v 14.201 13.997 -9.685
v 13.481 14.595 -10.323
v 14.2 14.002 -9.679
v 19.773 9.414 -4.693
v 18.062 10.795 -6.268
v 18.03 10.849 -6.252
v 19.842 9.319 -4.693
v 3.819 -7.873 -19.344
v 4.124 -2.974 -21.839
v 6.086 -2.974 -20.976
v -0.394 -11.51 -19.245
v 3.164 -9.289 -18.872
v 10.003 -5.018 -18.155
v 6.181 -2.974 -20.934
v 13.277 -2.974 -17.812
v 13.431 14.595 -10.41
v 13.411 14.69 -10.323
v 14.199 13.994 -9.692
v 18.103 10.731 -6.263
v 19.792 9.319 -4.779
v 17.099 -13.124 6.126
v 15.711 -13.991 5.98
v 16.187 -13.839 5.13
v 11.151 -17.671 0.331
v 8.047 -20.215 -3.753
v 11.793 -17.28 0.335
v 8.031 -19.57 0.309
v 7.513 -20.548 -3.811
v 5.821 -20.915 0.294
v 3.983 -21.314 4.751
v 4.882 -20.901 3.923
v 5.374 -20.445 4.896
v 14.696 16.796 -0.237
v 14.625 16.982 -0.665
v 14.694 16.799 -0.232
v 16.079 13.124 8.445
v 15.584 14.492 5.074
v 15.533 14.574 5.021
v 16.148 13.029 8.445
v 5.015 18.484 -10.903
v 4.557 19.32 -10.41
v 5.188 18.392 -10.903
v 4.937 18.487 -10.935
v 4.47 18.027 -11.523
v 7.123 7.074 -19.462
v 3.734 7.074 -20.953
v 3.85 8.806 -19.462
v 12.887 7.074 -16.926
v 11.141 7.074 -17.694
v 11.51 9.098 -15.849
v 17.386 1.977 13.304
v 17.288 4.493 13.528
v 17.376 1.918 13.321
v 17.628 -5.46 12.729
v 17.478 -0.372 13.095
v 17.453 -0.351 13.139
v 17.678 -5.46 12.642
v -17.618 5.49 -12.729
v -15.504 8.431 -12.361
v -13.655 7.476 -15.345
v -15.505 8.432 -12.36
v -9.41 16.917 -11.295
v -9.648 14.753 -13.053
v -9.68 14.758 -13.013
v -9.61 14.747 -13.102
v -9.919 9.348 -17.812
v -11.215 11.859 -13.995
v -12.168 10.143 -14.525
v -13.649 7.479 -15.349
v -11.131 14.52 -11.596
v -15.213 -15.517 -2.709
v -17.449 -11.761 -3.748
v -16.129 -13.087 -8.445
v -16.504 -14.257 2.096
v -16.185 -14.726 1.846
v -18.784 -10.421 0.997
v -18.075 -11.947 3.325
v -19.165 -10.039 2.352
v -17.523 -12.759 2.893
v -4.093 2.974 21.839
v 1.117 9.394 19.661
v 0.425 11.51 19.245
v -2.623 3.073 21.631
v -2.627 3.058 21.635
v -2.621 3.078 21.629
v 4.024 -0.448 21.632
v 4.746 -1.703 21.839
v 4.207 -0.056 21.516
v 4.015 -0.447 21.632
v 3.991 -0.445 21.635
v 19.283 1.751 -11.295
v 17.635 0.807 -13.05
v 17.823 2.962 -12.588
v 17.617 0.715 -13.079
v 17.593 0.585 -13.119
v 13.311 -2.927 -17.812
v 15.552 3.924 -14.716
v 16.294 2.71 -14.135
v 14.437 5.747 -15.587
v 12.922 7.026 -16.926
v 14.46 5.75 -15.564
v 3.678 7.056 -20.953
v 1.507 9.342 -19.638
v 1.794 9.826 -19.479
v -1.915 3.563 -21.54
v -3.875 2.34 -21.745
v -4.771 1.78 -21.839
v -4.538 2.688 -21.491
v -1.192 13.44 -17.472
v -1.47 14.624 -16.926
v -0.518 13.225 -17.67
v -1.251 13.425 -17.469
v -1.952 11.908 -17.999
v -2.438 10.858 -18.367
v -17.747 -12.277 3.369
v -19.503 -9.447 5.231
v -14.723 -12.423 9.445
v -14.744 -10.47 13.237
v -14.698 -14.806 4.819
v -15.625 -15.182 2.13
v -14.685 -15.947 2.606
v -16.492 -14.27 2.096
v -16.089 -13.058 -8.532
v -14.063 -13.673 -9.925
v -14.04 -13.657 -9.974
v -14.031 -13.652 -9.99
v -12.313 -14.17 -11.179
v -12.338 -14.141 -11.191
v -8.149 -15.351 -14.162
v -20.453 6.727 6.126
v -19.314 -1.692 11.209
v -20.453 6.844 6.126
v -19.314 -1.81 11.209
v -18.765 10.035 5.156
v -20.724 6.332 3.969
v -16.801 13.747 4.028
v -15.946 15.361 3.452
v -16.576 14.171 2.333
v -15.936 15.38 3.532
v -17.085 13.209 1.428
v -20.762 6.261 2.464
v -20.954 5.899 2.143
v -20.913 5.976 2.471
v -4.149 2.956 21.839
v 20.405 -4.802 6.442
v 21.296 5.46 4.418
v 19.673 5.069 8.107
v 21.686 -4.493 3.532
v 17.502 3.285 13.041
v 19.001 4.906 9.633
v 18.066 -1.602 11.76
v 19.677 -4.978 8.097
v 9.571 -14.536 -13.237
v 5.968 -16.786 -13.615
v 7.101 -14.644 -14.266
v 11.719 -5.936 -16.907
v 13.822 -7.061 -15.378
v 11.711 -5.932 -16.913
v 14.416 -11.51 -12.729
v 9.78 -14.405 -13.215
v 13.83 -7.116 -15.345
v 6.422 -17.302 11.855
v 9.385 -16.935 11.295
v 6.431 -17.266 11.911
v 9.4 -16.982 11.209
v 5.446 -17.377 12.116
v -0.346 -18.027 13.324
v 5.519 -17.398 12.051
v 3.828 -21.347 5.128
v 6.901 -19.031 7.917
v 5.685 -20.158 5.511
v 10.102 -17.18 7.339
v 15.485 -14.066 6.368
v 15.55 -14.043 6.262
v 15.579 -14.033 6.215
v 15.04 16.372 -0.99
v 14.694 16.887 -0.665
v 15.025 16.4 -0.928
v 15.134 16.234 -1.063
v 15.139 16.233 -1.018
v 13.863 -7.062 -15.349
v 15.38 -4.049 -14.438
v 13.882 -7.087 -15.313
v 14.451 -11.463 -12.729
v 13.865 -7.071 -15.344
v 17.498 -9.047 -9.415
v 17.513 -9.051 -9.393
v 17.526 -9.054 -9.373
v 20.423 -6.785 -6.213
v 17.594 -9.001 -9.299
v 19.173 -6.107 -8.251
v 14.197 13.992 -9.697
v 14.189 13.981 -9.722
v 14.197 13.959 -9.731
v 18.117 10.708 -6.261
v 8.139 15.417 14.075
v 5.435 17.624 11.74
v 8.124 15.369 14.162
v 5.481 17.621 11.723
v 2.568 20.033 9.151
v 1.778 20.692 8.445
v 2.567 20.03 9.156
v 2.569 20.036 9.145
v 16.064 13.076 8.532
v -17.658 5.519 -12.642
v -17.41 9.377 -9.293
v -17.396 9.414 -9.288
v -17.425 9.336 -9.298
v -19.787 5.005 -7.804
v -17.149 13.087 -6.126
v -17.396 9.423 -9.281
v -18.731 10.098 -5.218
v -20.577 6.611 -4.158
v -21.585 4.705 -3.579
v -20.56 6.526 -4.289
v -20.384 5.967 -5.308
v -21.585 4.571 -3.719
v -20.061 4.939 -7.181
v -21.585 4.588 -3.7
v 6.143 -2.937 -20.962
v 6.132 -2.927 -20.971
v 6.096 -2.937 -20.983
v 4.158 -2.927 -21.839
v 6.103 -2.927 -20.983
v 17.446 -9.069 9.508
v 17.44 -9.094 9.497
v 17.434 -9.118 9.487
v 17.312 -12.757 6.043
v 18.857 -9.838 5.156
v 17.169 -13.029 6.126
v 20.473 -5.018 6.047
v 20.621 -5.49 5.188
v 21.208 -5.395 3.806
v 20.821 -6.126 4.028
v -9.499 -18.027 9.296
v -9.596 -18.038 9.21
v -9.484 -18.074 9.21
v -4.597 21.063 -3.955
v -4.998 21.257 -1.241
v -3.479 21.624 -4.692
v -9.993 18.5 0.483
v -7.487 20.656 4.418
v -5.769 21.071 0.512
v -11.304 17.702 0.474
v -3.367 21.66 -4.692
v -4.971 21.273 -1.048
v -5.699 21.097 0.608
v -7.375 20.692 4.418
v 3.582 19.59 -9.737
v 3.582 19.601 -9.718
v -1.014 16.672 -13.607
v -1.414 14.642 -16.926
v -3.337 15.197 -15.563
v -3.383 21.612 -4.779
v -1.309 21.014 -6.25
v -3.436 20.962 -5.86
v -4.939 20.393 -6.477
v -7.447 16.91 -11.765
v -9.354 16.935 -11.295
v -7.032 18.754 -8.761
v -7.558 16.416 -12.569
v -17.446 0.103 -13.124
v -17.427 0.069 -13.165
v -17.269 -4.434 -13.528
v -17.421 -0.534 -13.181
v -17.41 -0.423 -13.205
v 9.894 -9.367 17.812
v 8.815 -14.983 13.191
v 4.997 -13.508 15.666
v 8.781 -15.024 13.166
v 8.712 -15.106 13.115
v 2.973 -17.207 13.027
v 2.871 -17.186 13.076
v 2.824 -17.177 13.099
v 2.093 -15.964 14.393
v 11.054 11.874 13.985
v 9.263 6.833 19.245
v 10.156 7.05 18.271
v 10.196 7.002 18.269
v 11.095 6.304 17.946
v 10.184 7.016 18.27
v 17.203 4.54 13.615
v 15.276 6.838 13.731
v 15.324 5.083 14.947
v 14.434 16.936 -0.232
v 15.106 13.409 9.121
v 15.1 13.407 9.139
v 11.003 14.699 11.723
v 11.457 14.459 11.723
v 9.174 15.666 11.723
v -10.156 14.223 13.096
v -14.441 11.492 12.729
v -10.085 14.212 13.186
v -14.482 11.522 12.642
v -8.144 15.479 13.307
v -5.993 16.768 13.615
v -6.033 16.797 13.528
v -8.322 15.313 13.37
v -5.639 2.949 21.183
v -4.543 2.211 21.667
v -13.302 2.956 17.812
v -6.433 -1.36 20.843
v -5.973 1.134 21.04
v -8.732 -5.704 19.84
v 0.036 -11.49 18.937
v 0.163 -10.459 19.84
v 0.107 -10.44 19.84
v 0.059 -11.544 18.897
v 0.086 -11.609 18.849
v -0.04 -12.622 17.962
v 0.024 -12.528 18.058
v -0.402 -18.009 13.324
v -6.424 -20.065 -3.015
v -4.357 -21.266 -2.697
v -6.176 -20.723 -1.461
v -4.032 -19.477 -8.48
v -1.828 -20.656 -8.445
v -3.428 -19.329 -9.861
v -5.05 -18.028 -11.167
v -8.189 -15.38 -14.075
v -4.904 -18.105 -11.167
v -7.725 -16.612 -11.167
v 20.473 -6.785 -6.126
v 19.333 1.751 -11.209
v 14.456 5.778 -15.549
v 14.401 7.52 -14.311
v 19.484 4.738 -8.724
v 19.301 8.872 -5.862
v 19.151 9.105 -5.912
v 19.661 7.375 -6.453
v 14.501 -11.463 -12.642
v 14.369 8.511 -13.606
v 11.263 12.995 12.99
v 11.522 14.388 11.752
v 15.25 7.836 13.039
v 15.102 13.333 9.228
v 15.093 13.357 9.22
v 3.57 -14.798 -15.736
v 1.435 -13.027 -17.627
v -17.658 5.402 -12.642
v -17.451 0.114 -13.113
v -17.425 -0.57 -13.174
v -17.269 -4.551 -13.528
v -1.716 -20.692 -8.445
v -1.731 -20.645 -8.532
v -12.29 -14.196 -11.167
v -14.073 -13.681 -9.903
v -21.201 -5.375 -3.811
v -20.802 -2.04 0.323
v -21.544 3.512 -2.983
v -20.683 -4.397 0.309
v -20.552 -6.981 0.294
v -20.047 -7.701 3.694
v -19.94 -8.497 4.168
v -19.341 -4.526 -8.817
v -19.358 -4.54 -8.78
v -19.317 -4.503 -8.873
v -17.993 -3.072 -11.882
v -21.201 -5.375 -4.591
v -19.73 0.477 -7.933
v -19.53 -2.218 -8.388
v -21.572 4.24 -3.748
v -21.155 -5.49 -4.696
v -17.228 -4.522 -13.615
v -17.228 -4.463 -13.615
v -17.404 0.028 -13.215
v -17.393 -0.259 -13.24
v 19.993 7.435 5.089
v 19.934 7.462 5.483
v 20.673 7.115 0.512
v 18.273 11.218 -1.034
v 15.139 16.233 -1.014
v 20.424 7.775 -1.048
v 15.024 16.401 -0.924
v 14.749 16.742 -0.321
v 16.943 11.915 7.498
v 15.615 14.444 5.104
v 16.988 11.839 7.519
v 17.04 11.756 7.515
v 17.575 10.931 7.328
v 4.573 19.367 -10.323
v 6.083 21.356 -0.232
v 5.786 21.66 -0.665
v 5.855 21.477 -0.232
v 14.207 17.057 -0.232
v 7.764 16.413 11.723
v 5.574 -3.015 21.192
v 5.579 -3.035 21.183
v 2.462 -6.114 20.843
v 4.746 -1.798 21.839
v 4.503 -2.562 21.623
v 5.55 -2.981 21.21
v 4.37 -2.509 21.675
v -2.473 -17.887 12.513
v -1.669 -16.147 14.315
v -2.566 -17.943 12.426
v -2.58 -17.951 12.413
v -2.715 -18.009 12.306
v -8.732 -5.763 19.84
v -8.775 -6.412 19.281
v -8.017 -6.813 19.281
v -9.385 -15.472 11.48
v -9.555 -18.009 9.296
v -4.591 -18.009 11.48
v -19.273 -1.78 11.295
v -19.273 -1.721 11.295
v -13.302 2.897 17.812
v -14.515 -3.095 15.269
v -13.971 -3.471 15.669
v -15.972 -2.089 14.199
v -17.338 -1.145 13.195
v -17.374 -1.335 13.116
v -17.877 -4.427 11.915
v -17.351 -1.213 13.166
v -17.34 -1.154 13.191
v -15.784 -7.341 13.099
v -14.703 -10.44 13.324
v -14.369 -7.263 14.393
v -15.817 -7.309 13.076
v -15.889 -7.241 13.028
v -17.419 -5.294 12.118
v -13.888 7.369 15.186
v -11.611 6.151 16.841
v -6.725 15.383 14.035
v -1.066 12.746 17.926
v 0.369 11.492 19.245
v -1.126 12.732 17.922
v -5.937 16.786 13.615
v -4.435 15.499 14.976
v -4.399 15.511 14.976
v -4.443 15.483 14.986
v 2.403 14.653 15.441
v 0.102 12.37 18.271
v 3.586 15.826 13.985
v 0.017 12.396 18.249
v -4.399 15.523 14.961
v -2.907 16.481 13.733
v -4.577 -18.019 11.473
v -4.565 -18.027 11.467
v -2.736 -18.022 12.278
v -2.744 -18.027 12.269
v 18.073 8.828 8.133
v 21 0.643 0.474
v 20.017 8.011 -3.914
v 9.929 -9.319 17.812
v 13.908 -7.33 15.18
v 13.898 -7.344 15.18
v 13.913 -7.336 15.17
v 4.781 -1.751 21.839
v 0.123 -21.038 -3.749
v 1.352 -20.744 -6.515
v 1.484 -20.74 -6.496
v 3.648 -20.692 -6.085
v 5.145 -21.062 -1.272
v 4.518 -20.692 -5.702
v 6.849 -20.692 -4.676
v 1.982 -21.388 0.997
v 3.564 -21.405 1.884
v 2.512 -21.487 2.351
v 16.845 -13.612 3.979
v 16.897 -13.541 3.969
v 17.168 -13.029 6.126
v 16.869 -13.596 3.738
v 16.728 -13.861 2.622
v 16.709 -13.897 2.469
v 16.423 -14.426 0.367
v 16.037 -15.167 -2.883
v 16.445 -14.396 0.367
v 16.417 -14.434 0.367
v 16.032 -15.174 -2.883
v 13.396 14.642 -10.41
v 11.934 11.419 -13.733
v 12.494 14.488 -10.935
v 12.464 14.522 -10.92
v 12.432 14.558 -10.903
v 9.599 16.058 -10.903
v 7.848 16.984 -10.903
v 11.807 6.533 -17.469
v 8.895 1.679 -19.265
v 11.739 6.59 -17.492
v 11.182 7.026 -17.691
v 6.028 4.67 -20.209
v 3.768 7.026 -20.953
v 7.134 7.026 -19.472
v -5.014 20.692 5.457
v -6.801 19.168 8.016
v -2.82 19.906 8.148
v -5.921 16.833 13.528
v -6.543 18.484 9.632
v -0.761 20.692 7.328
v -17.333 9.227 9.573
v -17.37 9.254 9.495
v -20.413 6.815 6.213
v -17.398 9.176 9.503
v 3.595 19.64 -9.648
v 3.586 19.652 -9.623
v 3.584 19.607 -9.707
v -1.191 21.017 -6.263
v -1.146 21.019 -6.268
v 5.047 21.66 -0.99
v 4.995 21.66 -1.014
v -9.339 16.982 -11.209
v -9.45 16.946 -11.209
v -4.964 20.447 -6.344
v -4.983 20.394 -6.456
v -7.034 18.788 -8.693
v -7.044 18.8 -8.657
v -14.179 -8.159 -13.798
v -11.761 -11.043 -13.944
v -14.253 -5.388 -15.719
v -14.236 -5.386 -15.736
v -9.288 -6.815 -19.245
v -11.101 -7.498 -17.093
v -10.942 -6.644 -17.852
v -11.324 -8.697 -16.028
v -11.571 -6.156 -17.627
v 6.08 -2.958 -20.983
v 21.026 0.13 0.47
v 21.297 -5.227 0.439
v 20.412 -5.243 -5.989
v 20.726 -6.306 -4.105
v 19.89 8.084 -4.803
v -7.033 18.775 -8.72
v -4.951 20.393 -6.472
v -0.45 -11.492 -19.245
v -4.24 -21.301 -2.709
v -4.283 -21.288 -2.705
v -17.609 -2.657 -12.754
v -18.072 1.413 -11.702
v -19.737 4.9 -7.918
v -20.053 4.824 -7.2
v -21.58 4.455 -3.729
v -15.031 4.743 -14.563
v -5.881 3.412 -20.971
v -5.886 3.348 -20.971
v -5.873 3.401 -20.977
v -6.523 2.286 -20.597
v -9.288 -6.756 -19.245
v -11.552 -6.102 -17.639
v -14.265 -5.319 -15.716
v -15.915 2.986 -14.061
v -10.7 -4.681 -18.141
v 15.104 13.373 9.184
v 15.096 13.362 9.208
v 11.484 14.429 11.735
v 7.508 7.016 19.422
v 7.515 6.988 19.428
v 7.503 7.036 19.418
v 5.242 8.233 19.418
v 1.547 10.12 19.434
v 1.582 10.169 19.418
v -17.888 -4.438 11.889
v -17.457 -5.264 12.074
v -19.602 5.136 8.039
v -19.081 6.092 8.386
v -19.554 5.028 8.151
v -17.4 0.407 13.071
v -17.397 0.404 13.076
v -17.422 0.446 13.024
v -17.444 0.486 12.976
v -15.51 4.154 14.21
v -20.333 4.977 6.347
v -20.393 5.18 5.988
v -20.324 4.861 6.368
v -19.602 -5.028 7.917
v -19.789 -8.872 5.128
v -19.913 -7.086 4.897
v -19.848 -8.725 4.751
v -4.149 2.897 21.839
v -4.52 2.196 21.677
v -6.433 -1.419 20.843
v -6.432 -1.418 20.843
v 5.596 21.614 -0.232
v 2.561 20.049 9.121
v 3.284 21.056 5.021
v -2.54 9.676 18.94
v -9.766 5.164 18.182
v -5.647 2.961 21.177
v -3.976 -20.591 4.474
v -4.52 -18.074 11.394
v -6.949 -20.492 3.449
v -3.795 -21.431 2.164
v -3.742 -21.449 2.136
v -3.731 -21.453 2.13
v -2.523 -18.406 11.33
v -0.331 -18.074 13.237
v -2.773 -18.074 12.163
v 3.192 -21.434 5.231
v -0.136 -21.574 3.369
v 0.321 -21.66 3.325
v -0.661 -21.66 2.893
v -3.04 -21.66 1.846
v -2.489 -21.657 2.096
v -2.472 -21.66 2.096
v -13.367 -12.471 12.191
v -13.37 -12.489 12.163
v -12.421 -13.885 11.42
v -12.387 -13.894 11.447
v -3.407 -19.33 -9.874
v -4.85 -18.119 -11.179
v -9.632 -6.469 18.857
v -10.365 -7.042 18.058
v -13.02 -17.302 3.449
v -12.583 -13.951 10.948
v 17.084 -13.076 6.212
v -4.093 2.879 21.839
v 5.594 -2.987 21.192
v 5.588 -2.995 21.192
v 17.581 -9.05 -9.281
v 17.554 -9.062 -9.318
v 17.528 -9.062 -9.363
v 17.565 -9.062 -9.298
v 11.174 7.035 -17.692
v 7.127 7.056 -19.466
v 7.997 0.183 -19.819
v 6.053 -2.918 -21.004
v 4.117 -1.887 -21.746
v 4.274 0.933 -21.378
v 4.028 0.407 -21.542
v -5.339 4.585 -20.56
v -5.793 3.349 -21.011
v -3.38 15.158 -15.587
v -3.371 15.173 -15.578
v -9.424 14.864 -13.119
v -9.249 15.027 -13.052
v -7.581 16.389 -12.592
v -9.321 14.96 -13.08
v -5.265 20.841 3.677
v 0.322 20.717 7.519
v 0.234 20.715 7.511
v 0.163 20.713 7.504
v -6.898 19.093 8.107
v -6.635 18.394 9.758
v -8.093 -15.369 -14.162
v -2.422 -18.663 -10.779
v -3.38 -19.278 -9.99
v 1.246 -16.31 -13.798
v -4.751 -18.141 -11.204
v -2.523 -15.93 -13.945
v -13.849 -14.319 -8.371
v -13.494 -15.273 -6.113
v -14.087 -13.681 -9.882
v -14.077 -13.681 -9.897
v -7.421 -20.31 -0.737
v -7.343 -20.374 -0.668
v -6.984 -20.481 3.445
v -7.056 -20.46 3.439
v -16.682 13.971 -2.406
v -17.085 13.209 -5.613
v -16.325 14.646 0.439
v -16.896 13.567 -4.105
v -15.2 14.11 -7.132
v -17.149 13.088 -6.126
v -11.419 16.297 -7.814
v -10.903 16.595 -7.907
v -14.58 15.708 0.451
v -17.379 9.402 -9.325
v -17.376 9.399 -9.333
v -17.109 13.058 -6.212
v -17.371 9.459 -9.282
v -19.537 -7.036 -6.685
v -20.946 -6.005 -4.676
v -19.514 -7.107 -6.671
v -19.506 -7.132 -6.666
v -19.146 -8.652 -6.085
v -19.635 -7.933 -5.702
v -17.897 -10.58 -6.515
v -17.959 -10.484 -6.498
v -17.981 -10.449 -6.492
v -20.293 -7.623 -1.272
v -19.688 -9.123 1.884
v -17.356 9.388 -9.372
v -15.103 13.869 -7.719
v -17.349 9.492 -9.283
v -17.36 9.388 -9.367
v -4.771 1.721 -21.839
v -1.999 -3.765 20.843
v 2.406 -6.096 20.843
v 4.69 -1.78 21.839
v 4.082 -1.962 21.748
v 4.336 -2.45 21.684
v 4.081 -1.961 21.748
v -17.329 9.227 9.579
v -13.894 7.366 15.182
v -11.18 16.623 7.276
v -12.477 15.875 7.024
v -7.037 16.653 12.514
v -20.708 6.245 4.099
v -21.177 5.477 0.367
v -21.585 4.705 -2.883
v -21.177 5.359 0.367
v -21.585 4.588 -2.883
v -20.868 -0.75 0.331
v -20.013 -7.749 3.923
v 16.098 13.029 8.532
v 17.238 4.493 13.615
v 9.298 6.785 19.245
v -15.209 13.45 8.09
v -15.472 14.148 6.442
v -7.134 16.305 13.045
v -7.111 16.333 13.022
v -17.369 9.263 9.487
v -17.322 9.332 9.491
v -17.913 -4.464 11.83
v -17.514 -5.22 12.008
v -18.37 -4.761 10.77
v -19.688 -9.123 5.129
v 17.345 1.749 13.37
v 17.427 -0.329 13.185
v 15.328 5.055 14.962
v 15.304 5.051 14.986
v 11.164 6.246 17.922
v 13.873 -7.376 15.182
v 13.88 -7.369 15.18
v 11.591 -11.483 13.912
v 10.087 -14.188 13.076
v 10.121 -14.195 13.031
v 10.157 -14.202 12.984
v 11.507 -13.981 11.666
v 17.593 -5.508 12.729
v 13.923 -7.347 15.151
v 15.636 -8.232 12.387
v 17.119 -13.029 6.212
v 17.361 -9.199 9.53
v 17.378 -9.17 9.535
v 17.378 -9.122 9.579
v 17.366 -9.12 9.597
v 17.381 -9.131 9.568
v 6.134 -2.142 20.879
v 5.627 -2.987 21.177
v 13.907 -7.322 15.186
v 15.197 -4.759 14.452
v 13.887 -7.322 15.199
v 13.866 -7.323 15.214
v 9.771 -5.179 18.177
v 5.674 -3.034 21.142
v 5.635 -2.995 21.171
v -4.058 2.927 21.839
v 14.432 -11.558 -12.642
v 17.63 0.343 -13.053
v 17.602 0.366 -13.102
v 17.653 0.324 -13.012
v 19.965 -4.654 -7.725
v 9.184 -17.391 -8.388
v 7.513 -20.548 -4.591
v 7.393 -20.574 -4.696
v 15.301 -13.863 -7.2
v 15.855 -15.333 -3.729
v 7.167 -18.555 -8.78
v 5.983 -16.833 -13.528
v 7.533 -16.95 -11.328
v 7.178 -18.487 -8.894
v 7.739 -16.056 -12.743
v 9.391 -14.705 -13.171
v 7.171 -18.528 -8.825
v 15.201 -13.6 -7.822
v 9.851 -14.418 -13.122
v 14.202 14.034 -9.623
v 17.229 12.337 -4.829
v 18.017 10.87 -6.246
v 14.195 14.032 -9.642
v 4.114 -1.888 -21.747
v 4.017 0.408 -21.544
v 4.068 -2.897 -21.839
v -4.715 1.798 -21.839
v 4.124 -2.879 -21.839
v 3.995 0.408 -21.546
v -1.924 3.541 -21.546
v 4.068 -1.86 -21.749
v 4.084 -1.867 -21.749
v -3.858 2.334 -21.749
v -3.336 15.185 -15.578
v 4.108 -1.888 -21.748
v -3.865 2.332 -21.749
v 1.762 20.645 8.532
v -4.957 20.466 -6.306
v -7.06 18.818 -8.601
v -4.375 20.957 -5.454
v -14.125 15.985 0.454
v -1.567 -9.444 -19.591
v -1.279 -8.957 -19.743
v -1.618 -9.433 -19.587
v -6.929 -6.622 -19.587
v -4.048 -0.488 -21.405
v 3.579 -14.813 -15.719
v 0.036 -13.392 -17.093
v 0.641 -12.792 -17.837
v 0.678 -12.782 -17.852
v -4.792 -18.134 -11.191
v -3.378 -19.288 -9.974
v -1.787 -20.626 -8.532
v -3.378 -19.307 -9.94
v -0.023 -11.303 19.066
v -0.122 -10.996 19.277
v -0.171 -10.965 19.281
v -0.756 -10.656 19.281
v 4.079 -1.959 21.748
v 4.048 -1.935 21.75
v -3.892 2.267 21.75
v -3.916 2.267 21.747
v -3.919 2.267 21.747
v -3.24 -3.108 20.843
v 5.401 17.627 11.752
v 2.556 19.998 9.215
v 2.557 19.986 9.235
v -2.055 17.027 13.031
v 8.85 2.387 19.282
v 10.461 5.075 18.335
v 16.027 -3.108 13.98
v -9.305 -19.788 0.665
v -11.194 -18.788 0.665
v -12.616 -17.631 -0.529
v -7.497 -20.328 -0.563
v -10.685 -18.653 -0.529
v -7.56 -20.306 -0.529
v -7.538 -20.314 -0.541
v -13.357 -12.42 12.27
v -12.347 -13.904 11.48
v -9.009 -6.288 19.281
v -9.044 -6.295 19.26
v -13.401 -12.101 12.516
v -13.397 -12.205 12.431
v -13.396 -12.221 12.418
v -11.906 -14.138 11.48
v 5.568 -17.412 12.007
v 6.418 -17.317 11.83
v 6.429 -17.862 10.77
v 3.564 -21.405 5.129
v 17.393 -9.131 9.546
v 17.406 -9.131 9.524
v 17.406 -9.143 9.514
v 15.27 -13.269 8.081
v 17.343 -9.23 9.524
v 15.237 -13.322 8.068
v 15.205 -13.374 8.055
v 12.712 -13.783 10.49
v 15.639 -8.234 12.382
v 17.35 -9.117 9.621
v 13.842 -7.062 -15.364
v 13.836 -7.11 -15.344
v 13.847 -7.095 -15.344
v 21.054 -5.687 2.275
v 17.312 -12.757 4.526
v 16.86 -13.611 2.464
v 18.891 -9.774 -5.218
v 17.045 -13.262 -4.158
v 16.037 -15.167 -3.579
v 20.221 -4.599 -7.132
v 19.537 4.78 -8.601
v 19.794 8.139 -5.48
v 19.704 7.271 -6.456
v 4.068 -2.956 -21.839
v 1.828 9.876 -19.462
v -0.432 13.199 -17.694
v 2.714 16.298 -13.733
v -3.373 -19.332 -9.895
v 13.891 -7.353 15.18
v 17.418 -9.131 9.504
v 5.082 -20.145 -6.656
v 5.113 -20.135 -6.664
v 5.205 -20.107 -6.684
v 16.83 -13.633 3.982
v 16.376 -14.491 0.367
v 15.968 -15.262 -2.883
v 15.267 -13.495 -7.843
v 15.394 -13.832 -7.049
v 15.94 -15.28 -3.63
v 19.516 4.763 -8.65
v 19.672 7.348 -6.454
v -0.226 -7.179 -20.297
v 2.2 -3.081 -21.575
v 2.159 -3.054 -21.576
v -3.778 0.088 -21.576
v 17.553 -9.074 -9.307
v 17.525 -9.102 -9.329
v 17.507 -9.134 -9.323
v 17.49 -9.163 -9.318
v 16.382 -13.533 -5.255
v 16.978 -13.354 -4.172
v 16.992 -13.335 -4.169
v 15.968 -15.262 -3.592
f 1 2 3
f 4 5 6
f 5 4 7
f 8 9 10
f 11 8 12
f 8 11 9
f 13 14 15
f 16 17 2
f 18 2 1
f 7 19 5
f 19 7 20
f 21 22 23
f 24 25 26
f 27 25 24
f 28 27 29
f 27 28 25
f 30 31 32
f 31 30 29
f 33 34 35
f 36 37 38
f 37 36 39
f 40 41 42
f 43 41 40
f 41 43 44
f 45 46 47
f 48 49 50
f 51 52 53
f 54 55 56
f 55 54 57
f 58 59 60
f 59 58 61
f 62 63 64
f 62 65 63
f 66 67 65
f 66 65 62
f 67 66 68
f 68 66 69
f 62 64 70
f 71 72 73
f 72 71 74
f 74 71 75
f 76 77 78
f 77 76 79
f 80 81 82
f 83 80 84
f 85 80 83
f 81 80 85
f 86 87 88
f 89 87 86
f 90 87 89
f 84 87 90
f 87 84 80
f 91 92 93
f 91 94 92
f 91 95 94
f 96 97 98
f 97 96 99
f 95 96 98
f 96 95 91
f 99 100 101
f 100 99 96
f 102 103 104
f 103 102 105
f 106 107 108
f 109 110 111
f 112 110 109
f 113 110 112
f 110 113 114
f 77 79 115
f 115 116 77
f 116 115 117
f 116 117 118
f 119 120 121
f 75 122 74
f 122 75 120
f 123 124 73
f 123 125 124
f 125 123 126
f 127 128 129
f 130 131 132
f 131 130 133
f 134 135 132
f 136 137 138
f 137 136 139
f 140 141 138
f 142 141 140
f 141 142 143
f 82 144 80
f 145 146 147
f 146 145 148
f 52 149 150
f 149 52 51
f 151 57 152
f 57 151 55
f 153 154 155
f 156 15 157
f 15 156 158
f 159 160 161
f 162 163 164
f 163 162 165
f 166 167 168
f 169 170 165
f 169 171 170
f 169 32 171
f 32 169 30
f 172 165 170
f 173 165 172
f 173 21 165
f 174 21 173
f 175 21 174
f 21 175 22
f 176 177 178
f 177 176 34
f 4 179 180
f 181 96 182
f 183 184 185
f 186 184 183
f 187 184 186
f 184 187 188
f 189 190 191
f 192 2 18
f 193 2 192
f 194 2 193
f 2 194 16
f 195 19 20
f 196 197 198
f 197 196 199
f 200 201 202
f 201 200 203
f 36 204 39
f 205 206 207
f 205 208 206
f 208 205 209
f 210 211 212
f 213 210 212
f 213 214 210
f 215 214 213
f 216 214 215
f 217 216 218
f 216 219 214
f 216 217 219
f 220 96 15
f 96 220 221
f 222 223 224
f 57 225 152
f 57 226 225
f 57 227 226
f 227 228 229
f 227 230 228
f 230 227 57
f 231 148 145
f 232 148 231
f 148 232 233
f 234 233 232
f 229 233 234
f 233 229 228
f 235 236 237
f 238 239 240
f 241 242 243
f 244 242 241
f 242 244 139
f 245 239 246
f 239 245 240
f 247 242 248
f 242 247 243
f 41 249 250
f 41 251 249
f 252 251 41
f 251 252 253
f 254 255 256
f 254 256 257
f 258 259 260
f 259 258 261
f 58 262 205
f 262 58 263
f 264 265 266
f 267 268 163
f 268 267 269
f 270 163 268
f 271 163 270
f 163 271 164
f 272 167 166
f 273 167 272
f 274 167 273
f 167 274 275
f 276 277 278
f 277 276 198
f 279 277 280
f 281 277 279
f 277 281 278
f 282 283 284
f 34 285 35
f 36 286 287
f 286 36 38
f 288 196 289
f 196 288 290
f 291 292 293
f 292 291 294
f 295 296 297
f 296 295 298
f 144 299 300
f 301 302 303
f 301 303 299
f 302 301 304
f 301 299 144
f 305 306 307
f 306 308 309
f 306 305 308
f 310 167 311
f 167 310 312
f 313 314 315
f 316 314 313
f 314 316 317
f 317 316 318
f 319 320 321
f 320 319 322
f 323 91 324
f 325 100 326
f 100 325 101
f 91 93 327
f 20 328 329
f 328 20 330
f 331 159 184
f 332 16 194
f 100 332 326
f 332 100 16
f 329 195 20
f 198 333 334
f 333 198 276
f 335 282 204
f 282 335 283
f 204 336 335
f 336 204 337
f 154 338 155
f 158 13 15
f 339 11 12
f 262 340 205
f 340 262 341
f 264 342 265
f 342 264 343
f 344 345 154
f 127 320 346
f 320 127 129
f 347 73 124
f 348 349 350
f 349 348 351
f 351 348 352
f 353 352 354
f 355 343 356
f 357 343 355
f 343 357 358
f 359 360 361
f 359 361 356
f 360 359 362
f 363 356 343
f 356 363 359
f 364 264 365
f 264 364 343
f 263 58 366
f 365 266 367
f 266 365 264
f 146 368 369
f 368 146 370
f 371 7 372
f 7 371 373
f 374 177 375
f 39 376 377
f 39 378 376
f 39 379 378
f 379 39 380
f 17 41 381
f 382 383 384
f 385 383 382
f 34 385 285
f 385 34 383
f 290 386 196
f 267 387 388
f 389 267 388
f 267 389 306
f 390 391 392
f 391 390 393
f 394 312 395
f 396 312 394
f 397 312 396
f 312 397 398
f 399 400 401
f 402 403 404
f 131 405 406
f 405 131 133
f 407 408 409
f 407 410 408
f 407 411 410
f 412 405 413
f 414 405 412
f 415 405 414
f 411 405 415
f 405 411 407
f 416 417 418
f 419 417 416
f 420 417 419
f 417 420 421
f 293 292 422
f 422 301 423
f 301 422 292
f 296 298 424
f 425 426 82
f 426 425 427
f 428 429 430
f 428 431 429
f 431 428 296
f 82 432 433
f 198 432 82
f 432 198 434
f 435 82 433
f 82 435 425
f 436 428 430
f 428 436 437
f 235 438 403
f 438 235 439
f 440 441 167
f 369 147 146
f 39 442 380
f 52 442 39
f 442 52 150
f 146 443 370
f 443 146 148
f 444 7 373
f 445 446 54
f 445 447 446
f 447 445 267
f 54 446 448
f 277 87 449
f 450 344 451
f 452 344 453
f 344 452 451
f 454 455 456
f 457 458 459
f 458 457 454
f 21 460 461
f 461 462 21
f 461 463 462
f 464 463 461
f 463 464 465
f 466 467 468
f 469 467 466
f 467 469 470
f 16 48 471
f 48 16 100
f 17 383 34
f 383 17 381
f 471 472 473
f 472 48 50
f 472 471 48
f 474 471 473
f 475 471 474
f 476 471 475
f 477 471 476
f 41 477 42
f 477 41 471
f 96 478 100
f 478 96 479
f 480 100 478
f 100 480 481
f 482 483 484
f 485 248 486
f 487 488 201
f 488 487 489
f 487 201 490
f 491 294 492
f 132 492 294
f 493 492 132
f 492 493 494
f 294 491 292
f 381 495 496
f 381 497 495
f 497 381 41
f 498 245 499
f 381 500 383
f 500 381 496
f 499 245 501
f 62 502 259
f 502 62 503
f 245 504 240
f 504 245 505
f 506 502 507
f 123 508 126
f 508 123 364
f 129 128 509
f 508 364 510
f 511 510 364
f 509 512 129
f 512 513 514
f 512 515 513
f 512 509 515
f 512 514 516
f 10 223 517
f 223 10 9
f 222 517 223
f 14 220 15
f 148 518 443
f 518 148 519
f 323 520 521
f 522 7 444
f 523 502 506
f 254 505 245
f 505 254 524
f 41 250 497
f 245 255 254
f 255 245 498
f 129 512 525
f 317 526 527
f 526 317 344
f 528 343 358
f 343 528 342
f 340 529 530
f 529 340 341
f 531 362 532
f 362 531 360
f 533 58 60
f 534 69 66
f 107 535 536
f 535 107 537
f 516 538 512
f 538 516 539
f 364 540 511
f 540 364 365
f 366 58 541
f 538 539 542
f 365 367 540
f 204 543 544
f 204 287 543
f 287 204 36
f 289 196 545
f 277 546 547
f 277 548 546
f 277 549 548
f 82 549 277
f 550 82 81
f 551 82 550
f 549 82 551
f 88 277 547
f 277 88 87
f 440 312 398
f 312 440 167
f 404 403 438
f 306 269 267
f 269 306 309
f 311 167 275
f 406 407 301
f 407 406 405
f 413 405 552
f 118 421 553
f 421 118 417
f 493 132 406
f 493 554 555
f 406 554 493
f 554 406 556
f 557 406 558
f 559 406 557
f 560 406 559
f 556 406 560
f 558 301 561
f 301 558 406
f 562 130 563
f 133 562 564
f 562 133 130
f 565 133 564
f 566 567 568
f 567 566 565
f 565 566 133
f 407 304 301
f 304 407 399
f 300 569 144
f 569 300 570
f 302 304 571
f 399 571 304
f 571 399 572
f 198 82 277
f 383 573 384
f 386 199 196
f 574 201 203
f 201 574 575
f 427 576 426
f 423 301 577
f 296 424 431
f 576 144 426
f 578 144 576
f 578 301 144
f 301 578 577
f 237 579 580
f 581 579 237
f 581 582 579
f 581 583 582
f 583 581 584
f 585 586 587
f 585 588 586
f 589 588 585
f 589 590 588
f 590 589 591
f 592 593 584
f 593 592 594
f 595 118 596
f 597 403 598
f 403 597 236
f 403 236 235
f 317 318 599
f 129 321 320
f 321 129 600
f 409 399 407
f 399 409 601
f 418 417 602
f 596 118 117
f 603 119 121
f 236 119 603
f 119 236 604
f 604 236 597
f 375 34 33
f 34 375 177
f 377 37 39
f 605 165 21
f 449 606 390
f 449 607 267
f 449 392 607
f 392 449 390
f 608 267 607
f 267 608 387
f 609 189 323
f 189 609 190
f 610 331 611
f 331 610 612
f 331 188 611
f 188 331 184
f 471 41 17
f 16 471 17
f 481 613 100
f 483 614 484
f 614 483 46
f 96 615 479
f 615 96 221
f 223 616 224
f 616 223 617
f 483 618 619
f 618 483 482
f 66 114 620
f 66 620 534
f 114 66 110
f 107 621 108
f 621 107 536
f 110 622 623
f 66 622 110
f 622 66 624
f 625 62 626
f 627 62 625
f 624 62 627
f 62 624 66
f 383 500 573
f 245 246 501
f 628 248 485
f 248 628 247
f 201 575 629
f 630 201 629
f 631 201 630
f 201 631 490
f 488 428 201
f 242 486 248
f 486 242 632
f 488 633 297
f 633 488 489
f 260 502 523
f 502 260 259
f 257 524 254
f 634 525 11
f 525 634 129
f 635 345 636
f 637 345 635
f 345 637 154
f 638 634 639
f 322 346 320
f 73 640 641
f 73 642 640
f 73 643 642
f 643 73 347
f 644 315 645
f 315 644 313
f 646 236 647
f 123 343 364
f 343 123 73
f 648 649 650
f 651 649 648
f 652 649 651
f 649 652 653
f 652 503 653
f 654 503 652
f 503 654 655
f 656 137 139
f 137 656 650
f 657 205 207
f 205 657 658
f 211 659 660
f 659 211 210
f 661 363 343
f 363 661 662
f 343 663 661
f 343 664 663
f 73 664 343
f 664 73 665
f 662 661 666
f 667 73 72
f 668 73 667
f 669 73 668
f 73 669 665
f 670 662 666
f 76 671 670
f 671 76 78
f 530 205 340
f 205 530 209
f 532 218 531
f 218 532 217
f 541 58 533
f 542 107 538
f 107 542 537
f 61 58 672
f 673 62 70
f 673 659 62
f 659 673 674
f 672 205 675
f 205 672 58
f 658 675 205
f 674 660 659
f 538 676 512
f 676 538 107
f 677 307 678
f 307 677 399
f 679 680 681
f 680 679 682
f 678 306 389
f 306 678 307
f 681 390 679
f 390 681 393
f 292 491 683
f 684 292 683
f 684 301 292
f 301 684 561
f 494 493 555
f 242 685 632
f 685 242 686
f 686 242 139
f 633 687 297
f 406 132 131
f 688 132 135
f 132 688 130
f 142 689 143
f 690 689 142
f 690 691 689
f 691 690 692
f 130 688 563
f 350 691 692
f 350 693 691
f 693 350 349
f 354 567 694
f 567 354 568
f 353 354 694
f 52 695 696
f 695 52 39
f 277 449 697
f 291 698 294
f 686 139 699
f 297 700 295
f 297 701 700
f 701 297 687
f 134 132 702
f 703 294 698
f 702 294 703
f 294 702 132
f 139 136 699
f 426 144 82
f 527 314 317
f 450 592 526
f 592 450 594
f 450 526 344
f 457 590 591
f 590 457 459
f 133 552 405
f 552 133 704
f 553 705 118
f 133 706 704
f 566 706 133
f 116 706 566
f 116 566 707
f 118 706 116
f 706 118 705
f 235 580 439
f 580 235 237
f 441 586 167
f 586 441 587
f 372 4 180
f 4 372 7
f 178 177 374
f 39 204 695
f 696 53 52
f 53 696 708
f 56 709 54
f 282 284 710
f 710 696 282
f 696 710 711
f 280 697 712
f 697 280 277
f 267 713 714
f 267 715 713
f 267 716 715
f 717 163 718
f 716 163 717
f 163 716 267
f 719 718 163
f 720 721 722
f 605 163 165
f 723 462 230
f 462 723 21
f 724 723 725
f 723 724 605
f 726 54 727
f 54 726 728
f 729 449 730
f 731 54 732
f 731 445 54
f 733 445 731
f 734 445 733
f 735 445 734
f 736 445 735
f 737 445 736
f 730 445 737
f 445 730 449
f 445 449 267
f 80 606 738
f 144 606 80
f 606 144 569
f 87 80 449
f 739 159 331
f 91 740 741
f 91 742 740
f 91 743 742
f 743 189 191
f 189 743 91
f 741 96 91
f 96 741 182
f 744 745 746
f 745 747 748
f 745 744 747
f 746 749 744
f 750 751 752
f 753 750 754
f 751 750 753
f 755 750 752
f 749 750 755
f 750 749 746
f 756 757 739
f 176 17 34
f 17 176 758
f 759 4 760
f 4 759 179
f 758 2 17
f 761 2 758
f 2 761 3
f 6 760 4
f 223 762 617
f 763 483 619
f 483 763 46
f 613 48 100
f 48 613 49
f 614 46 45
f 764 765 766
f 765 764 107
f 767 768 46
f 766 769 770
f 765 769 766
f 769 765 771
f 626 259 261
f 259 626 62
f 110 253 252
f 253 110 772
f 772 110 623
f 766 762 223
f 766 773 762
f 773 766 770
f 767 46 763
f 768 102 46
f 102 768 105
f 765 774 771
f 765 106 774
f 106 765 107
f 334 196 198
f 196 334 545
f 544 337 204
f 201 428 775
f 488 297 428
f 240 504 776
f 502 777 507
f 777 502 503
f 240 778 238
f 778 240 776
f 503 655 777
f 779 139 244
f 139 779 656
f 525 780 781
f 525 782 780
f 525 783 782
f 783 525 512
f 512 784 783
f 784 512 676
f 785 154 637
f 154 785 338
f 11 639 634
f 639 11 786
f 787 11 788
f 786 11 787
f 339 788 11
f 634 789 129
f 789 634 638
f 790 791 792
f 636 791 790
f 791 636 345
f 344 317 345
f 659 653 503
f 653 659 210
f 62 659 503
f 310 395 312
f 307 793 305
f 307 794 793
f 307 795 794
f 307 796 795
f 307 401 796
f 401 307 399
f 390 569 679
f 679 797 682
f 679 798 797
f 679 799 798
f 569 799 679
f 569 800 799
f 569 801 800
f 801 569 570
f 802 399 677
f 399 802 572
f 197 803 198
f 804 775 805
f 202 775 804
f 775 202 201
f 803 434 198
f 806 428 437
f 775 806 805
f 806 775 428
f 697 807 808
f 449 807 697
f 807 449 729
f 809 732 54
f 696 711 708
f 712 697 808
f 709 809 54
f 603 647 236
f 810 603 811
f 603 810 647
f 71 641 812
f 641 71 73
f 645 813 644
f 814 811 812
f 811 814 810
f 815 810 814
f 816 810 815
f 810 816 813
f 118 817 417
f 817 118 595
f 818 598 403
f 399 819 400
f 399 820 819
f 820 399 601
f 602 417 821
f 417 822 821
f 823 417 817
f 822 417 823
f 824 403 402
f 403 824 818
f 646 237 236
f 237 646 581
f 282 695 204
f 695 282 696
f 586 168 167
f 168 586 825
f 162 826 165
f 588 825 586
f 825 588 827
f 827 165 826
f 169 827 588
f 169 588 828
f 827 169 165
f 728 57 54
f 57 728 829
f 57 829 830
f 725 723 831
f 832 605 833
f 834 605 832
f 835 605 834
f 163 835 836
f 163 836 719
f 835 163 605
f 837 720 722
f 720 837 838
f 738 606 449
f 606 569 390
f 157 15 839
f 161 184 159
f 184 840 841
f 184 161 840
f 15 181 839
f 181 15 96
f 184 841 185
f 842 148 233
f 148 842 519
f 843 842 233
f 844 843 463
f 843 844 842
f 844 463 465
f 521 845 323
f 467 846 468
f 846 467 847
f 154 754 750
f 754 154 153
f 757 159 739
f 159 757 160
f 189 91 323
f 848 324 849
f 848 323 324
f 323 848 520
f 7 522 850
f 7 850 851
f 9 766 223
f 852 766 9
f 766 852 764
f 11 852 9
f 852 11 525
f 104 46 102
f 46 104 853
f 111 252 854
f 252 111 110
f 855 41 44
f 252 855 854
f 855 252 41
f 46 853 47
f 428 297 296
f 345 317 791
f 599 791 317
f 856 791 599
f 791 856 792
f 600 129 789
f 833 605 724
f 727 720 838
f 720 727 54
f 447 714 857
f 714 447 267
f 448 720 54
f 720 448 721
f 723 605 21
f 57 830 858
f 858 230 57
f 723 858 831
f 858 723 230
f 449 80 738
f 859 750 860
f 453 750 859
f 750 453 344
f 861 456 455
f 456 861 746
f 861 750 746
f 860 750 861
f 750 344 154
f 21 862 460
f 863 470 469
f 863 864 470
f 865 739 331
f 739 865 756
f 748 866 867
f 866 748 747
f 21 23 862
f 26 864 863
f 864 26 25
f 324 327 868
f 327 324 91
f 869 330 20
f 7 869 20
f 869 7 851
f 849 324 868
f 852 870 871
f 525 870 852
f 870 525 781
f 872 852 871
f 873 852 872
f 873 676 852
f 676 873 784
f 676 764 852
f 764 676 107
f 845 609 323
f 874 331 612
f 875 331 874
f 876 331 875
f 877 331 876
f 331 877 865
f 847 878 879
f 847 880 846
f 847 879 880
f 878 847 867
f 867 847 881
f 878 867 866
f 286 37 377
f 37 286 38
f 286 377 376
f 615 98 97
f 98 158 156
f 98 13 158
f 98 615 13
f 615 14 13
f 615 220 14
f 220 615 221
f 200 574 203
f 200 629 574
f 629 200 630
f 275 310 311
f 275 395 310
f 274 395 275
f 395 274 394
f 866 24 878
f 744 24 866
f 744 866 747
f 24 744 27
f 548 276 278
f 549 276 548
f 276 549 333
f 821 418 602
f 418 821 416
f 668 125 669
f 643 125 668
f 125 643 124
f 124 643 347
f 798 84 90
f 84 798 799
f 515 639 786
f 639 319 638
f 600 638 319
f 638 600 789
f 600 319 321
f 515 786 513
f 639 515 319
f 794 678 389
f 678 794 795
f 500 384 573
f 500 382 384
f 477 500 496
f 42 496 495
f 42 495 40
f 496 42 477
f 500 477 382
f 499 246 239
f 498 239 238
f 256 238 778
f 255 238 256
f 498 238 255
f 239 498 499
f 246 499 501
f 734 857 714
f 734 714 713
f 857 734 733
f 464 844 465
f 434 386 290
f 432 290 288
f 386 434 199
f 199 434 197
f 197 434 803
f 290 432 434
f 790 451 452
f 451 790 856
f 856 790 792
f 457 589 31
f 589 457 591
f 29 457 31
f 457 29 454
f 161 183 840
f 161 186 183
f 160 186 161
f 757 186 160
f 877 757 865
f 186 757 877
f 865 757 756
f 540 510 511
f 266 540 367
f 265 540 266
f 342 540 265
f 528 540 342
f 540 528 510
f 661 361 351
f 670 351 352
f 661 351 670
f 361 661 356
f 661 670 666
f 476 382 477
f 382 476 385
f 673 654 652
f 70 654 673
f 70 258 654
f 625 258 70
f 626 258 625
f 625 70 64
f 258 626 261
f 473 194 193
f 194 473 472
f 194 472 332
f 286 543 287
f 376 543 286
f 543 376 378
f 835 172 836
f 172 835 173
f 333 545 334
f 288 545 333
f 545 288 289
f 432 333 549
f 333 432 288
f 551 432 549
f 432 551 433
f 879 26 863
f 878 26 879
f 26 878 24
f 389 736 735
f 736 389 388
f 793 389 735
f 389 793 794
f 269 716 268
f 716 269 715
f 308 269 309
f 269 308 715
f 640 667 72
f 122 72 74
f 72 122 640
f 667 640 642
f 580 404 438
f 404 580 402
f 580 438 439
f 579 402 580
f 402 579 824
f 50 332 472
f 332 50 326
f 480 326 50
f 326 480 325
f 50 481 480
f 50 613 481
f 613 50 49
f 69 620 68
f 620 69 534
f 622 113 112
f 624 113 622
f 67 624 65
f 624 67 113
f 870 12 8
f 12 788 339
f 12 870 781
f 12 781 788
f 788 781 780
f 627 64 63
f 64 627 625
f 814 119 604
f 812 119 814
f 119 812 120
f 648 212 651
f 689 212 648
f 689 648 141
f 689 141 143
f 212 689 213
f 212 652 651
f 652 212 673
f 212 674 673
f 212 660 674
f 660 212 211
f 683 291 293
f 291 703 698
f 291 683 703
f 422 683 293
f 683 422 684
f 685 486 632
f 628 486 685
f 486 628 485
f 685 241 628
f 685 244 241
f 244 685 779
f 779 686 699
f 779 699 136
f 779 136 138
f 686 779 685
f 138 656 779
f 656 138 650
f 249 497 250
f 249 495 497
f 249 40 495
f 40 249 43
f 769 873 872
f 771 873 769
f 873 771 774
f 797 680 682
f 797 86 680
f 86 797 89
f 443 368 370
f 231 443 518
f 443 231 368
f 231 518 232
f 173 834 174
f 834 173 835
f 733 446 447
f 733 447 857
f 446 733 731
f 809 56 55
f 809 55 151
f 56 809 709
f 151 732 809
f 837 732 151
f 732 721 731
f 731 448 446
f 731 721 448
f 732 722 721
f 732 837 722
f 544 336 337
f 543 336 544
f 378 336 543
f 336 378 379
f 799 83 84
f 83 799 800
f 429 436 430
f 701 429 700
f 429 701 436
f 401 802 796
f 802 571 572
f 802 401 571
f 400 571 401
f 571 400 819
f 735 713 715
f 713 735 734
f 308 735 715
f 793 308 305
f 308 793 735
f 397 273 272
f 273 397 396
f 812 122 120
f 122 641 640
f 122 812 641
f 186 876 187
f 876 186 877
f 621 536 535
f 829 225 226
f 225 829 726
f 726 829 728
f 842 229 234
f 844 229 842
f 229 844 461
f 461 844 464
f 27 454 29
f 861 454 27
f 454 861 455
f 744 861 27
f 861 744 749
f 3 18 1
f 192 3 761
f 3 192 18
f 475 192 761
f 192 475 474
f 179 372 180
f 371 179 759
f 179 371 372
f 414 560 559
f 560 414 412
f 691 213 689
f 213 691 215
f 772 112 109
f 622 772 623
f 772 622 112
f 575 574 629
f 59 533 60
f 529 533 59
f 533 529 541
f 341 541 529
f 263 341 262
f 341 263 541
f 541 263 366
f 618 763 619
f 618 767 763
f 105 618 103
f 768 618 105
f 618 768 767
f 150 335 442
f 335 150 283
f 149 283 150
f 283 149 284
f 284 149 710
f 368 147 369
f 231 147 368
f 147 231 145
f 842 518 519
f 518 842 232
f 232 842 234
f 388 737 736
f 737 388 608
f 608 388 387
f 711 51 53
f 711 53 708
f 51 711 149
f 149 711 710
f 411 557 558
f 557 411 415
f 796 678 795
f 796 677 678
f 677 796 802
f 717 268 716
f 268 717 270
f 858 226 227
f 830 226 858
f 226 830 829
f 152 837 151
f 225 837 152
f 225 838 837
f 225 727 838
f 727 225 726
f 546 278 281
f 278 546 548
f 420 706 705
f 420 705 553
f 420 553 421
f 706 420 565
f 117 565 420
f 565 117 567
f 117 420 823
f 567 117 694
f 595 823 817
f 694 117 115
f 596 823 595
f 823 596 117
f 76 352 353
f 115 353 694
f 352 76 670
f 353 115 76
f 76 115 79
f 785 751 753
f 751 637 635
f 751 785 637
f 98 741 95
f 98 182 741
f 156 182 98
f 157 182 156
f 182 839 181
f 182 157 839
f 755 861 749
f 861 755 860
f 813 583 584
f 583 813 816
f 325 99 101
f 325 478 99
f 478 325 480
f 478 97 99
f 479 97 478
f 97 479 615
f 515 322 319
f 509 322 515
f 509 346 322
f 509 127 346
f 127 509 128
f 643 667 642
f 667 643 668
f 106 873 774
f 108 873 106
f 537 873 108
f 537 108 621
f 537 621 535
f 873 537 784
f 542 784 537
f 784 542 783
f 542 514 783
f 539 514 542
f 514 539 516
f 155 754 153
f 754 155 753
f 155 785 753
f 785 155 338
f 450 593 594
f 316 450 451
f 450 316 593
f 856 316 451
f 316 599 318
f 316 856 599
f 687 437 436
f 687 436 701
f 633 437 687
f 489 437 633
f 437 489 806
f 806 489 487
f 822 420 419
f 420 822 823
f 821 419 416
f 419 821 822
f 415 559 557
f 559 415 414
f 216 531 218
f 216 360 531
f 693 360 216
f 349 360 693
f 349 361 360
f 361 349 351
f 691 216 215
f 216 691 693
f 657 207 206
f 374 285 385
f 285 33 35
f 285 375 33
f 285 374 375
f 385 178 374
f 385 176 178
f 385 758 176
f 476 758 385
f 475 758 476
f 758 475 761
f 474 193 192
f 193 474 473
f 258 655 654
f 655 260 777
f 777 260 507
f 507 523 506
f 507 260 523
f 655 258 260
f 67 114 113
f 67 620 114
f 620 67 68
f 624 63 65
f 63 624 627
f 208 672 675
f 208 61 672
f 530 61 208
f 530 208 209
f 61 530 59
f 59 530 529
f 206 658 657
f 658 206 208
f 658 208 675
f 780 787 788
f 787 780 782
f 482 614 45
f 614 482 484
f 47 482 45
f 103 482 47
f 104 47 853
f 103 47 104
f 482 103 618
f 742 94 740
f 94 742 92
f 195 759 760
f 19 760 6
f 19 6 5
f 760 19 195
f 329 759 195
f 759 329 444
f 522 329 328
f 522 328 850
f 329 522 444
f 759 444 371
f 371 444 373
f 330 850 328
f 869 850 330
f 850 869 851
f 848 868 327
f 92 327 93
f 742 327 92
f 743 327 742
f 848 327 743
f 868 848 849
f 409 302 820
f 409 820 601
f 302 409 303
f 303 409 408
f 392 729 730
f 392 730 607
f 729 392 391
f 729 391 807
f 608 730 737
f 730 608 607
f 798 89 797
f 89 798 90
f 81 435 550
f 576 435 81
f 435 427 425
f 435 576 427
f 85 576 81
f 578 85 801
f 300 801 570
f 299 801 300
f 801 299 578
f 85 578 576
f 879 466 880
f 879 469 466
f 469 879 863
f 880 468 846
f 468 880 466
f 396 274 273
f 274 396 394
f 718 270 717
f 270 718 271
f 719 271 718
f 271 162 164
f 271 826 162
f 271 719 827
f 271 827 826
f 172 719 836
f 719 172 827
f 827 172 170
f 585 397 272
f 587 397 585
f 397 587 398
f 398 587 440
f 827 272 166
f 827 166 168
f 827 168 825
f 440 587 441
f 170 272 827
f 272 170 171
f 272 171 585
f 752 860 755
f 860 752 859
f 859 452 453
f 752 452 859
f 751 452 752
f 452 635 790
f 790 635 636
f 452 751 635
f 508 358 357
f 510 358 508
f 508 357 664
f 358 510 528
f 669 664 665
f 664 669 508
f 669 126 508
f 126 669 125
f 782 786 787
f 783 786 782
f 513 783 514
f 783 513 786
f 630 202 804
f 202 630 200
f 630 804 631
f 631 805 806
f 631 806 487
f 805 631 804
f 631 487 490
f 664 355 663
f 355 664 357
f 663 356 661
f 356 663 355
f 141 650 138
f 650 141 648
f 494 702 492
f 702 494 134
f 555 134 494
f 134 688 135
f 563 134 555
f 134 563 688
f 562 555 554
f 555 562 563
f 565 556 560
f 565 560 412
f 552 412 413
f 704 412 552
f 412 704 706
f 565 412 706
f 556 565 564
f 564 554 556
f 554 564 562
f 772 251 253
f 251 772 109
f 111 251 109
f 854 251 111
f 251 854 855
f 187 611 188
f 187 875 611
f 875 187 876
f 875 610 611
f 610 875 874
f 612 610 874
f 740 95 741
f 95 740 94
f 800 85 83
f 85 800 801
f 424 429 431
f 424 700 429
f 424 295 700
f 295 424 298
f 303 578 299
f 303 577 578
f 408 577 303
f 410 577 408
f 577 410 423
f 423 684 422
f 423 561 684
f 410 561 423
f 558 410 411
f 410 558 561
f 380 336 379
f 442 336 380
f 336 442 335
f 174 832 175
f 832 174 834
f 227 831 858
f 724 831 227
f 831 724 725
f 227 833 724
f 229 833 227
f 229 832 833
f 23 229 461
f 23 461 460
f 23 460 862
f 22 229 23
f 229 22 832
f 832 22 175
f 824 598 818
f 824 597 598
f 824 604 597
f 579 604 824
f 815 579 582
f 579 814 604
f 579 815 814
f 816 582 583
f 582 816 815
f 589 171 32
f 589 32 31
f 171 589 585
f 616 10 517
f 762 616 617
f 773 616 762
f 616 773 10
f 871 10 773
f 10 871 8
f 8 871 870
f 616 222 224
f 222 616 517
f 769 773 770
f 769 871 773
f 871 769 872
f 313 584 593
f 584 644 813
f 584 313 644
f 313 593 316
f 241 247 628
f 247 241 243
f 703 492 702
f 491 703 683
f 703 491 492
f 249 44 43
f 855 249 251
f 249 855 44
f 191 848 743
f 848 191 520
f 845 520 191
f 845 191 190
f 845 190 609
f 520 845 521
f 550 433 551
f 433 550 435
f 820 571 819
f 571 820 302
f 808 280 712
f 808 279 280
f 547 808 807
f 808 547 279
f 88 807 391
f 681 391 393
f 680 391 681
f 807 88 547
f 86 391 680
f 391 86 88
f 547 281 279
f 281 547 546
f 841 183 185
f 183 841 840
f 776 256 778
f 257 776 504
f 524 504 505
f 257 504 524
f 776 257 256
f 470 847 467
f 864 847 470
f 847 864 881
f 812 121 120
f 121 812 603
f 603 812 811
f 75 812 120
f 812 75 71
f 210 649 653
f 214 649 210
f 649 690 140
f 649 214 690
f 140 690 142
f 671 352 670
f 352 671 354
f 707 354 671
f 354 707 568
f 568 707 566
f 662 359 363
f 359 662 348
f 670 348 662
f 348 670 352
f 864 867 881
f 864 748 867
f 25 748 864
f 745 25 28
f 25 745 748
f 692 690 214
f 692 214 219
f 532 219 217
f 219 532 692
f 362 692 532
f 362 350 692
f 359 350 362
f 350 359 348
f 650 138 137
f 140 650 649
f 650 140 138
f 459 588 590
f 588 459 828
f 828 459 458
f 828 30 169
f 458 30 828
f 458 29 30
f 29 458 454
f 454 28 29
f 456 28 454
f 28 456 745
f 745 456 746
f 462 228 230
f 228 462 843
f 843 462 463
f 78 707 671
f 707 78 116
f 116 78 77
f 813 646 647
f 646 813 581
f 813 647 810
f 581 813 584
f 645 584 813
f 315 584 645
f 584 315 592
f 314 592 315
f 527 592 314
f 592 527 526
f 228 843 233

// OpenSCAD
// Auto-generated OpenSCAD file

    inner_points = 10*[[0.3533042389474486, -2.1309567627878985, -0.49328765376831396], [-0.1434686338513388, 1.458507778837387, 1.7006204863472152], [0.9546307475624638, -1.655329376601087, -1.1353040239225165], [0.45785787476367645, 1.9341351650241985, 1.0586041161930126], [-0.43704610665881893, -1.894813525510864, -1.0586041161930126], [-0.9338189794576062, 1.6946510161144215, 1.1353040239225165], [0.1642804019561963, -1.4191861393240526, -1.7006204863472152], [-0.3324924708425911, 2.1702784023012325, 0.49328765376831396], [1.442367608438407, -1.1419910934272737, 1.2594119381637667], [1.3250954410800369, -0.29463345877858294, 1.777323395621165], [2.043694117053422, -0.6663637072404623, 0.6173955680095642], [1.9264219496950519, 0.1809939274082285, 1.1353070254669624], [-1.9056101815901942, -0.14167228789489406, -1.1353070254669624], [-2.022882348948565, 0.7056853467537968, -0.6173955680095642], [-1.3042836729751792, 0.3339550982919174, -1.777323395621165], [-1.4215558403335493, 1.1813127329406081, -1.2594119381637667], [-0.23698424864327555, -2.1774209753120197, 0.31256628980481815], [-0.926685010406531, -0.6821269514814432, 1.9014264532614829], [1.7378471241176563, 0.4853053537177433, -1.3361099908367842], [1.6205749567592862, 1.3326629883664343, -0.818198533379386], [-1.0273345942495429, -1.9412777380349853, -0.25275017261988053], [-1.7170353560127987, -0.44598371420440885, 1.3361099908367842], [0.9474967785113886, 0.7214485909947776, -1.9014264532614829], [0.8302246111530187, 1.5688062256434685, -1.3835149958040847], [-1.272154046123399, -1.3349344510202745, 1.227265112107367], [-0.9888880786112537, 0.9299408496408343, 1.7773209673206987], [1.0096998467161113, -0.8906192101274999, -1.7773209673206987], [0.5854051592791625, 2.1751495126581784, 0.09650028892316316], [1.5936743508035691, -1.5167318536526972, 0.34471218833297446], [1.2866518307249903, 0.7016792344842905, 1.7006219871194381], [-1.2658400626201327, -0.662357594970956, -1.7006219871194381], [-1.5728625826987115, 1.5560534931660317, -0.34471218833297446], [-0.04282195529156968, -1.1498727155477642, 1.901427380789726], [2.1327977912138616, 0.5709633336563915, -0.42140966776201205], [-2.1119860231090044, -0.5316416941430571, 0.42140966776201205], [0.0636337233964272, 1.1891943550610986, -1.901427380789726], [0.7482549060436543, -2.04529878284925, 0.4214126693064581], [0.36875420060323677, 0.6968081241273445, 2.097409351964589], [1.7212216353190553, -1.2757175060187171, -0.6173916389368752], [1.341720929878638, 1.4663894009578775, 1.0586050437212557], [-1.3209091617737803, -1.427067761444543, -1.0586050437212557], [-1.7004098672141976, 1.3150391455320516, 0.6173916389368752], [-0.34794243249837925, -0.65748648461401, -2.097409351964589], [-0.7274431379387967, 2.084620422362584, -0.4214126693064581], [0.5969481636784919, -1.6705580226238264, 1.3361124191372504], [0.40719781095828333, -0.29950456913552903, 2.174110760466316], [2.171241401568908, -0.4253493596064819, -0.34470825926028514], [1.9814910488486996, 0.9457040938818155, 0.4932900820687803], [-1.960679280743842, -0.9063824543684811, -0.4932900820687803], [-2.150429633464051, 0.46467099911981635, 0.34470825926028514], [-0.3863860428534258, 0.3388262086488635, -2.174110760466316], [-0.5761363955736345, 1.7098796621371608, -1.3361124191372504], [-0.38829099100843784, -1.8026802150865957, 1.2272660396356103], [-0.47666524415667827, 0.16824119493079182, 2.174109832938073], [1.7762907344727028, -0.51100733954513, -1.2594085823350576], [1.469268214394124, 1.7074037485918578, 0.0965012164514063], [-1.6671047132196049, -1.4205924309589228, 0.31256478903259505], [-1.7554789663678452, 0.5503289790584645, 1.2594085823350576], [0.4974770122615358, -0.12891955541745742, -2.174109832938073], [0.19045449218295696, 2.0894915327195305, -0.818200034151609]];

    outer_points = 10*[[0.3397964015329416, -2.1564818960662593, 0.4692464330642543], [0.1746904120016975, 2.059700581213336, 0.8445026661911221], [0.7406306924188368, -2.059700581213336, -0.44177785220224774], [0.5755247028875927, 2.1564818960662593, -0.0665216190753799], [-0.5755247028875927, -2.1564818960662593, 0.0665216190753799], [-0.7406306924188368, 2.059700581213336, 0.44177785220224774], [-0.1746904120016975, -2.059700581213336, -0.8445026661911221], [-0.3397964015329416, 2.1564818960662593, -0.4692464330642543], [1.7577521828507068, -0.5460434925171852, 1.2642039967754415], [1.7187759458289644, 0.4492621776642618, 1.3527899767738907], [2.158586473736602, -0.4492621776642618, 0.35317971150893934], [2.11961023671486, 0.5460434925171852, 0.44176569150738865], [-2.11961023671486, -0.5460434925171852, -0.44176569150738865], [-2.158586473736602, 0.4492621776642618, -0.35317971150893934], [-1.7187759458289644, -0.4492621776642618, -1.3527899767738907], [-1.7577521828507068, 0.5460434925171852, -1.2642039967754415], [-0.03615139041812482, -1.7979315082680976, 1.3237081800938717], [-0.4108082182533923, 0.29266672075632677, 2.1752357977646932], [1.3261293226739266, -0.29266672075632677, -1.772510983775819], [1.2871530856521844, 0.7026389494251202, -1.6839250037773699], [-0.951472494838659, -1.7979315082680976, 0.9209833661049974], [-1.3261293226739266, 0.29266672075632677, 1.772510983775819], [0.4108082182533923, -0.29266672075632677, -2.1752357977646932], [0.37183198123165007, 0.7026389494251202, -2.086649817766244], [-0.8691142525215587, -0.5733571998568047, 1.9753404554496539], [-0.5952075738469856, 1.673836486075555, 1.3527998149826952], [0.5952075738469856, -1.673836486075555, -1.3527998149826952], [0.45419022354875016, 1.9272132578364132, -1.0322927284215873], [1.706851989845039, -1.3028720368652604, 0.6125754792810341], [1.6048108765685456, 1.3028720368652604, 0.8444965858436926], [-1.6048108765685456, -1.3028720368652604, -0.8444965858436926], [-1.706851989845039, 1.3028720368652604, -0.6125754792810341], [0.4730548368557097, -0.1750790433068909, 2.1752320399033187], [1.9232869251373408, 0.1750790433068909, -1.1208847887674662], [-1.9232869251373408, -0.1750790433068909, 1.1208847887674662], [-0.4730548368557097, 0.1750790433068909, -2.1752320399033187], [0.9369540039963559, -1.6887361320030414, 1.1208726280726071], [0.810824251486854, 1.5321406750951065, 1.4075428812010258], [1.5855175105061965, -1.5321406750951065, -0.3531956300651734], [1.4593877579966947, 1.6887361320030414, -0.06652537693675475], [-1.4593877579966947, -1.6887361320030414, 0.06652537693675475], [-1.5855175105061965, 1.5321406750951065, 0.3531956300651734], [-0.810824251486854, -1.5321406750951065, -1.4075428812010258], [-0.9369540039963559, 1.6887361320030414, -1.1208726280726071], [0.9878541970020238, -0.9319075876549662, 1.7725011455670145], [0.9247893207472729, 0.6785308158941078, 1.9158362721312236], [2.0372519943977596, -0.6785308158941078, -0.6125913978372679], [1.9741871181430086, 0.9319075876549662, -0.4692562712730588], [-1.9741871181430086, -0.9319075876549662, 0.4692562712730588], [-2.0372519943977596, 0.6785308158941078, 0.6125913978372679], [-0.9247893207472729, -0.6785308158941078, -1.9158362721312236], [-0.9878541970020238, 0.9319075876549662, -1.7725011455670145], [0.014748802587543075, -1.0411029639200224, 1.9753366975882793], [0.04092626563817092, 1.1462765799573253, 1.9158400299925986], [1.4400943919343452, -1.1462765799573253, -1.2642175928456207], [1.3380532786578523, 1.4594674937731955, -1.0322964862829624], [-1.4662718549849731, -1.0411029639200224, 1.3237142604413015], [-1.4400943919343452, 1.1462765799573253, 1.2642175928456207], [-0.04092626563817092, -1.1462765799573253, -1.9158400299925986], [-0.14296737891466405, 1.4594674937731955, -1.6839189234299403]];

    // Convex hull for inner set (I)
    module inner_hull() {
        hull() {
            for (p = inner_points) {
                translate(p) sphere(r=0.1);
            }
        }
    }

    // Convex hull for outer set (O) minus inner hull (O \ I)
    module outer_minus_inner() {
        difference() {
            hull() {
                for (p = outer_points) {
                    translate(p) sphere(r=0.1);
                }
            }
            inner_hull(); // Subtract inner hull
        }
    }

    // Convex hull for outer set (O) minus all translated inner hulls
    module outer_minus_AllTranslationInner() {
        difference() {
            hull() {
                for (p = outer_points) {
                    translate(p) sphere(r=0.1);
                }
            }
            hull() {
                translate([0,0,50]) inner_hull();
                translate([0,0,-50]) inner_hull();
            }; // Subtract translated inner hulls
        }
    }

    // Difference between outer_minus_inner and outer_minus_AllTranslationInner
    module outer_minus_inner_diff() {
        difference() {
            // Outer minus inner
            difference() {
                hull() {
                    for (p = outer_points) {
                        translate(p) sphere(r=0.1);
                    }
                }
                inner_hull();
            }

            // Subtract Outer minus AllTranslationInner
            difference() {
                hull() {
                    for (p = outer_points) {
                        translate(p) sphere(r=0.1);
                    }
                }
                hull() {
                    translate([0,0,50]) inner_hull();
                    translate([0,0,-50]) inner_hull();
                };
            }
        }
    }

    // Rendering all with colors applied
    color([1, 1, 0, 1]) outer_minus_inner_diff(); // Opaque yellow
    
